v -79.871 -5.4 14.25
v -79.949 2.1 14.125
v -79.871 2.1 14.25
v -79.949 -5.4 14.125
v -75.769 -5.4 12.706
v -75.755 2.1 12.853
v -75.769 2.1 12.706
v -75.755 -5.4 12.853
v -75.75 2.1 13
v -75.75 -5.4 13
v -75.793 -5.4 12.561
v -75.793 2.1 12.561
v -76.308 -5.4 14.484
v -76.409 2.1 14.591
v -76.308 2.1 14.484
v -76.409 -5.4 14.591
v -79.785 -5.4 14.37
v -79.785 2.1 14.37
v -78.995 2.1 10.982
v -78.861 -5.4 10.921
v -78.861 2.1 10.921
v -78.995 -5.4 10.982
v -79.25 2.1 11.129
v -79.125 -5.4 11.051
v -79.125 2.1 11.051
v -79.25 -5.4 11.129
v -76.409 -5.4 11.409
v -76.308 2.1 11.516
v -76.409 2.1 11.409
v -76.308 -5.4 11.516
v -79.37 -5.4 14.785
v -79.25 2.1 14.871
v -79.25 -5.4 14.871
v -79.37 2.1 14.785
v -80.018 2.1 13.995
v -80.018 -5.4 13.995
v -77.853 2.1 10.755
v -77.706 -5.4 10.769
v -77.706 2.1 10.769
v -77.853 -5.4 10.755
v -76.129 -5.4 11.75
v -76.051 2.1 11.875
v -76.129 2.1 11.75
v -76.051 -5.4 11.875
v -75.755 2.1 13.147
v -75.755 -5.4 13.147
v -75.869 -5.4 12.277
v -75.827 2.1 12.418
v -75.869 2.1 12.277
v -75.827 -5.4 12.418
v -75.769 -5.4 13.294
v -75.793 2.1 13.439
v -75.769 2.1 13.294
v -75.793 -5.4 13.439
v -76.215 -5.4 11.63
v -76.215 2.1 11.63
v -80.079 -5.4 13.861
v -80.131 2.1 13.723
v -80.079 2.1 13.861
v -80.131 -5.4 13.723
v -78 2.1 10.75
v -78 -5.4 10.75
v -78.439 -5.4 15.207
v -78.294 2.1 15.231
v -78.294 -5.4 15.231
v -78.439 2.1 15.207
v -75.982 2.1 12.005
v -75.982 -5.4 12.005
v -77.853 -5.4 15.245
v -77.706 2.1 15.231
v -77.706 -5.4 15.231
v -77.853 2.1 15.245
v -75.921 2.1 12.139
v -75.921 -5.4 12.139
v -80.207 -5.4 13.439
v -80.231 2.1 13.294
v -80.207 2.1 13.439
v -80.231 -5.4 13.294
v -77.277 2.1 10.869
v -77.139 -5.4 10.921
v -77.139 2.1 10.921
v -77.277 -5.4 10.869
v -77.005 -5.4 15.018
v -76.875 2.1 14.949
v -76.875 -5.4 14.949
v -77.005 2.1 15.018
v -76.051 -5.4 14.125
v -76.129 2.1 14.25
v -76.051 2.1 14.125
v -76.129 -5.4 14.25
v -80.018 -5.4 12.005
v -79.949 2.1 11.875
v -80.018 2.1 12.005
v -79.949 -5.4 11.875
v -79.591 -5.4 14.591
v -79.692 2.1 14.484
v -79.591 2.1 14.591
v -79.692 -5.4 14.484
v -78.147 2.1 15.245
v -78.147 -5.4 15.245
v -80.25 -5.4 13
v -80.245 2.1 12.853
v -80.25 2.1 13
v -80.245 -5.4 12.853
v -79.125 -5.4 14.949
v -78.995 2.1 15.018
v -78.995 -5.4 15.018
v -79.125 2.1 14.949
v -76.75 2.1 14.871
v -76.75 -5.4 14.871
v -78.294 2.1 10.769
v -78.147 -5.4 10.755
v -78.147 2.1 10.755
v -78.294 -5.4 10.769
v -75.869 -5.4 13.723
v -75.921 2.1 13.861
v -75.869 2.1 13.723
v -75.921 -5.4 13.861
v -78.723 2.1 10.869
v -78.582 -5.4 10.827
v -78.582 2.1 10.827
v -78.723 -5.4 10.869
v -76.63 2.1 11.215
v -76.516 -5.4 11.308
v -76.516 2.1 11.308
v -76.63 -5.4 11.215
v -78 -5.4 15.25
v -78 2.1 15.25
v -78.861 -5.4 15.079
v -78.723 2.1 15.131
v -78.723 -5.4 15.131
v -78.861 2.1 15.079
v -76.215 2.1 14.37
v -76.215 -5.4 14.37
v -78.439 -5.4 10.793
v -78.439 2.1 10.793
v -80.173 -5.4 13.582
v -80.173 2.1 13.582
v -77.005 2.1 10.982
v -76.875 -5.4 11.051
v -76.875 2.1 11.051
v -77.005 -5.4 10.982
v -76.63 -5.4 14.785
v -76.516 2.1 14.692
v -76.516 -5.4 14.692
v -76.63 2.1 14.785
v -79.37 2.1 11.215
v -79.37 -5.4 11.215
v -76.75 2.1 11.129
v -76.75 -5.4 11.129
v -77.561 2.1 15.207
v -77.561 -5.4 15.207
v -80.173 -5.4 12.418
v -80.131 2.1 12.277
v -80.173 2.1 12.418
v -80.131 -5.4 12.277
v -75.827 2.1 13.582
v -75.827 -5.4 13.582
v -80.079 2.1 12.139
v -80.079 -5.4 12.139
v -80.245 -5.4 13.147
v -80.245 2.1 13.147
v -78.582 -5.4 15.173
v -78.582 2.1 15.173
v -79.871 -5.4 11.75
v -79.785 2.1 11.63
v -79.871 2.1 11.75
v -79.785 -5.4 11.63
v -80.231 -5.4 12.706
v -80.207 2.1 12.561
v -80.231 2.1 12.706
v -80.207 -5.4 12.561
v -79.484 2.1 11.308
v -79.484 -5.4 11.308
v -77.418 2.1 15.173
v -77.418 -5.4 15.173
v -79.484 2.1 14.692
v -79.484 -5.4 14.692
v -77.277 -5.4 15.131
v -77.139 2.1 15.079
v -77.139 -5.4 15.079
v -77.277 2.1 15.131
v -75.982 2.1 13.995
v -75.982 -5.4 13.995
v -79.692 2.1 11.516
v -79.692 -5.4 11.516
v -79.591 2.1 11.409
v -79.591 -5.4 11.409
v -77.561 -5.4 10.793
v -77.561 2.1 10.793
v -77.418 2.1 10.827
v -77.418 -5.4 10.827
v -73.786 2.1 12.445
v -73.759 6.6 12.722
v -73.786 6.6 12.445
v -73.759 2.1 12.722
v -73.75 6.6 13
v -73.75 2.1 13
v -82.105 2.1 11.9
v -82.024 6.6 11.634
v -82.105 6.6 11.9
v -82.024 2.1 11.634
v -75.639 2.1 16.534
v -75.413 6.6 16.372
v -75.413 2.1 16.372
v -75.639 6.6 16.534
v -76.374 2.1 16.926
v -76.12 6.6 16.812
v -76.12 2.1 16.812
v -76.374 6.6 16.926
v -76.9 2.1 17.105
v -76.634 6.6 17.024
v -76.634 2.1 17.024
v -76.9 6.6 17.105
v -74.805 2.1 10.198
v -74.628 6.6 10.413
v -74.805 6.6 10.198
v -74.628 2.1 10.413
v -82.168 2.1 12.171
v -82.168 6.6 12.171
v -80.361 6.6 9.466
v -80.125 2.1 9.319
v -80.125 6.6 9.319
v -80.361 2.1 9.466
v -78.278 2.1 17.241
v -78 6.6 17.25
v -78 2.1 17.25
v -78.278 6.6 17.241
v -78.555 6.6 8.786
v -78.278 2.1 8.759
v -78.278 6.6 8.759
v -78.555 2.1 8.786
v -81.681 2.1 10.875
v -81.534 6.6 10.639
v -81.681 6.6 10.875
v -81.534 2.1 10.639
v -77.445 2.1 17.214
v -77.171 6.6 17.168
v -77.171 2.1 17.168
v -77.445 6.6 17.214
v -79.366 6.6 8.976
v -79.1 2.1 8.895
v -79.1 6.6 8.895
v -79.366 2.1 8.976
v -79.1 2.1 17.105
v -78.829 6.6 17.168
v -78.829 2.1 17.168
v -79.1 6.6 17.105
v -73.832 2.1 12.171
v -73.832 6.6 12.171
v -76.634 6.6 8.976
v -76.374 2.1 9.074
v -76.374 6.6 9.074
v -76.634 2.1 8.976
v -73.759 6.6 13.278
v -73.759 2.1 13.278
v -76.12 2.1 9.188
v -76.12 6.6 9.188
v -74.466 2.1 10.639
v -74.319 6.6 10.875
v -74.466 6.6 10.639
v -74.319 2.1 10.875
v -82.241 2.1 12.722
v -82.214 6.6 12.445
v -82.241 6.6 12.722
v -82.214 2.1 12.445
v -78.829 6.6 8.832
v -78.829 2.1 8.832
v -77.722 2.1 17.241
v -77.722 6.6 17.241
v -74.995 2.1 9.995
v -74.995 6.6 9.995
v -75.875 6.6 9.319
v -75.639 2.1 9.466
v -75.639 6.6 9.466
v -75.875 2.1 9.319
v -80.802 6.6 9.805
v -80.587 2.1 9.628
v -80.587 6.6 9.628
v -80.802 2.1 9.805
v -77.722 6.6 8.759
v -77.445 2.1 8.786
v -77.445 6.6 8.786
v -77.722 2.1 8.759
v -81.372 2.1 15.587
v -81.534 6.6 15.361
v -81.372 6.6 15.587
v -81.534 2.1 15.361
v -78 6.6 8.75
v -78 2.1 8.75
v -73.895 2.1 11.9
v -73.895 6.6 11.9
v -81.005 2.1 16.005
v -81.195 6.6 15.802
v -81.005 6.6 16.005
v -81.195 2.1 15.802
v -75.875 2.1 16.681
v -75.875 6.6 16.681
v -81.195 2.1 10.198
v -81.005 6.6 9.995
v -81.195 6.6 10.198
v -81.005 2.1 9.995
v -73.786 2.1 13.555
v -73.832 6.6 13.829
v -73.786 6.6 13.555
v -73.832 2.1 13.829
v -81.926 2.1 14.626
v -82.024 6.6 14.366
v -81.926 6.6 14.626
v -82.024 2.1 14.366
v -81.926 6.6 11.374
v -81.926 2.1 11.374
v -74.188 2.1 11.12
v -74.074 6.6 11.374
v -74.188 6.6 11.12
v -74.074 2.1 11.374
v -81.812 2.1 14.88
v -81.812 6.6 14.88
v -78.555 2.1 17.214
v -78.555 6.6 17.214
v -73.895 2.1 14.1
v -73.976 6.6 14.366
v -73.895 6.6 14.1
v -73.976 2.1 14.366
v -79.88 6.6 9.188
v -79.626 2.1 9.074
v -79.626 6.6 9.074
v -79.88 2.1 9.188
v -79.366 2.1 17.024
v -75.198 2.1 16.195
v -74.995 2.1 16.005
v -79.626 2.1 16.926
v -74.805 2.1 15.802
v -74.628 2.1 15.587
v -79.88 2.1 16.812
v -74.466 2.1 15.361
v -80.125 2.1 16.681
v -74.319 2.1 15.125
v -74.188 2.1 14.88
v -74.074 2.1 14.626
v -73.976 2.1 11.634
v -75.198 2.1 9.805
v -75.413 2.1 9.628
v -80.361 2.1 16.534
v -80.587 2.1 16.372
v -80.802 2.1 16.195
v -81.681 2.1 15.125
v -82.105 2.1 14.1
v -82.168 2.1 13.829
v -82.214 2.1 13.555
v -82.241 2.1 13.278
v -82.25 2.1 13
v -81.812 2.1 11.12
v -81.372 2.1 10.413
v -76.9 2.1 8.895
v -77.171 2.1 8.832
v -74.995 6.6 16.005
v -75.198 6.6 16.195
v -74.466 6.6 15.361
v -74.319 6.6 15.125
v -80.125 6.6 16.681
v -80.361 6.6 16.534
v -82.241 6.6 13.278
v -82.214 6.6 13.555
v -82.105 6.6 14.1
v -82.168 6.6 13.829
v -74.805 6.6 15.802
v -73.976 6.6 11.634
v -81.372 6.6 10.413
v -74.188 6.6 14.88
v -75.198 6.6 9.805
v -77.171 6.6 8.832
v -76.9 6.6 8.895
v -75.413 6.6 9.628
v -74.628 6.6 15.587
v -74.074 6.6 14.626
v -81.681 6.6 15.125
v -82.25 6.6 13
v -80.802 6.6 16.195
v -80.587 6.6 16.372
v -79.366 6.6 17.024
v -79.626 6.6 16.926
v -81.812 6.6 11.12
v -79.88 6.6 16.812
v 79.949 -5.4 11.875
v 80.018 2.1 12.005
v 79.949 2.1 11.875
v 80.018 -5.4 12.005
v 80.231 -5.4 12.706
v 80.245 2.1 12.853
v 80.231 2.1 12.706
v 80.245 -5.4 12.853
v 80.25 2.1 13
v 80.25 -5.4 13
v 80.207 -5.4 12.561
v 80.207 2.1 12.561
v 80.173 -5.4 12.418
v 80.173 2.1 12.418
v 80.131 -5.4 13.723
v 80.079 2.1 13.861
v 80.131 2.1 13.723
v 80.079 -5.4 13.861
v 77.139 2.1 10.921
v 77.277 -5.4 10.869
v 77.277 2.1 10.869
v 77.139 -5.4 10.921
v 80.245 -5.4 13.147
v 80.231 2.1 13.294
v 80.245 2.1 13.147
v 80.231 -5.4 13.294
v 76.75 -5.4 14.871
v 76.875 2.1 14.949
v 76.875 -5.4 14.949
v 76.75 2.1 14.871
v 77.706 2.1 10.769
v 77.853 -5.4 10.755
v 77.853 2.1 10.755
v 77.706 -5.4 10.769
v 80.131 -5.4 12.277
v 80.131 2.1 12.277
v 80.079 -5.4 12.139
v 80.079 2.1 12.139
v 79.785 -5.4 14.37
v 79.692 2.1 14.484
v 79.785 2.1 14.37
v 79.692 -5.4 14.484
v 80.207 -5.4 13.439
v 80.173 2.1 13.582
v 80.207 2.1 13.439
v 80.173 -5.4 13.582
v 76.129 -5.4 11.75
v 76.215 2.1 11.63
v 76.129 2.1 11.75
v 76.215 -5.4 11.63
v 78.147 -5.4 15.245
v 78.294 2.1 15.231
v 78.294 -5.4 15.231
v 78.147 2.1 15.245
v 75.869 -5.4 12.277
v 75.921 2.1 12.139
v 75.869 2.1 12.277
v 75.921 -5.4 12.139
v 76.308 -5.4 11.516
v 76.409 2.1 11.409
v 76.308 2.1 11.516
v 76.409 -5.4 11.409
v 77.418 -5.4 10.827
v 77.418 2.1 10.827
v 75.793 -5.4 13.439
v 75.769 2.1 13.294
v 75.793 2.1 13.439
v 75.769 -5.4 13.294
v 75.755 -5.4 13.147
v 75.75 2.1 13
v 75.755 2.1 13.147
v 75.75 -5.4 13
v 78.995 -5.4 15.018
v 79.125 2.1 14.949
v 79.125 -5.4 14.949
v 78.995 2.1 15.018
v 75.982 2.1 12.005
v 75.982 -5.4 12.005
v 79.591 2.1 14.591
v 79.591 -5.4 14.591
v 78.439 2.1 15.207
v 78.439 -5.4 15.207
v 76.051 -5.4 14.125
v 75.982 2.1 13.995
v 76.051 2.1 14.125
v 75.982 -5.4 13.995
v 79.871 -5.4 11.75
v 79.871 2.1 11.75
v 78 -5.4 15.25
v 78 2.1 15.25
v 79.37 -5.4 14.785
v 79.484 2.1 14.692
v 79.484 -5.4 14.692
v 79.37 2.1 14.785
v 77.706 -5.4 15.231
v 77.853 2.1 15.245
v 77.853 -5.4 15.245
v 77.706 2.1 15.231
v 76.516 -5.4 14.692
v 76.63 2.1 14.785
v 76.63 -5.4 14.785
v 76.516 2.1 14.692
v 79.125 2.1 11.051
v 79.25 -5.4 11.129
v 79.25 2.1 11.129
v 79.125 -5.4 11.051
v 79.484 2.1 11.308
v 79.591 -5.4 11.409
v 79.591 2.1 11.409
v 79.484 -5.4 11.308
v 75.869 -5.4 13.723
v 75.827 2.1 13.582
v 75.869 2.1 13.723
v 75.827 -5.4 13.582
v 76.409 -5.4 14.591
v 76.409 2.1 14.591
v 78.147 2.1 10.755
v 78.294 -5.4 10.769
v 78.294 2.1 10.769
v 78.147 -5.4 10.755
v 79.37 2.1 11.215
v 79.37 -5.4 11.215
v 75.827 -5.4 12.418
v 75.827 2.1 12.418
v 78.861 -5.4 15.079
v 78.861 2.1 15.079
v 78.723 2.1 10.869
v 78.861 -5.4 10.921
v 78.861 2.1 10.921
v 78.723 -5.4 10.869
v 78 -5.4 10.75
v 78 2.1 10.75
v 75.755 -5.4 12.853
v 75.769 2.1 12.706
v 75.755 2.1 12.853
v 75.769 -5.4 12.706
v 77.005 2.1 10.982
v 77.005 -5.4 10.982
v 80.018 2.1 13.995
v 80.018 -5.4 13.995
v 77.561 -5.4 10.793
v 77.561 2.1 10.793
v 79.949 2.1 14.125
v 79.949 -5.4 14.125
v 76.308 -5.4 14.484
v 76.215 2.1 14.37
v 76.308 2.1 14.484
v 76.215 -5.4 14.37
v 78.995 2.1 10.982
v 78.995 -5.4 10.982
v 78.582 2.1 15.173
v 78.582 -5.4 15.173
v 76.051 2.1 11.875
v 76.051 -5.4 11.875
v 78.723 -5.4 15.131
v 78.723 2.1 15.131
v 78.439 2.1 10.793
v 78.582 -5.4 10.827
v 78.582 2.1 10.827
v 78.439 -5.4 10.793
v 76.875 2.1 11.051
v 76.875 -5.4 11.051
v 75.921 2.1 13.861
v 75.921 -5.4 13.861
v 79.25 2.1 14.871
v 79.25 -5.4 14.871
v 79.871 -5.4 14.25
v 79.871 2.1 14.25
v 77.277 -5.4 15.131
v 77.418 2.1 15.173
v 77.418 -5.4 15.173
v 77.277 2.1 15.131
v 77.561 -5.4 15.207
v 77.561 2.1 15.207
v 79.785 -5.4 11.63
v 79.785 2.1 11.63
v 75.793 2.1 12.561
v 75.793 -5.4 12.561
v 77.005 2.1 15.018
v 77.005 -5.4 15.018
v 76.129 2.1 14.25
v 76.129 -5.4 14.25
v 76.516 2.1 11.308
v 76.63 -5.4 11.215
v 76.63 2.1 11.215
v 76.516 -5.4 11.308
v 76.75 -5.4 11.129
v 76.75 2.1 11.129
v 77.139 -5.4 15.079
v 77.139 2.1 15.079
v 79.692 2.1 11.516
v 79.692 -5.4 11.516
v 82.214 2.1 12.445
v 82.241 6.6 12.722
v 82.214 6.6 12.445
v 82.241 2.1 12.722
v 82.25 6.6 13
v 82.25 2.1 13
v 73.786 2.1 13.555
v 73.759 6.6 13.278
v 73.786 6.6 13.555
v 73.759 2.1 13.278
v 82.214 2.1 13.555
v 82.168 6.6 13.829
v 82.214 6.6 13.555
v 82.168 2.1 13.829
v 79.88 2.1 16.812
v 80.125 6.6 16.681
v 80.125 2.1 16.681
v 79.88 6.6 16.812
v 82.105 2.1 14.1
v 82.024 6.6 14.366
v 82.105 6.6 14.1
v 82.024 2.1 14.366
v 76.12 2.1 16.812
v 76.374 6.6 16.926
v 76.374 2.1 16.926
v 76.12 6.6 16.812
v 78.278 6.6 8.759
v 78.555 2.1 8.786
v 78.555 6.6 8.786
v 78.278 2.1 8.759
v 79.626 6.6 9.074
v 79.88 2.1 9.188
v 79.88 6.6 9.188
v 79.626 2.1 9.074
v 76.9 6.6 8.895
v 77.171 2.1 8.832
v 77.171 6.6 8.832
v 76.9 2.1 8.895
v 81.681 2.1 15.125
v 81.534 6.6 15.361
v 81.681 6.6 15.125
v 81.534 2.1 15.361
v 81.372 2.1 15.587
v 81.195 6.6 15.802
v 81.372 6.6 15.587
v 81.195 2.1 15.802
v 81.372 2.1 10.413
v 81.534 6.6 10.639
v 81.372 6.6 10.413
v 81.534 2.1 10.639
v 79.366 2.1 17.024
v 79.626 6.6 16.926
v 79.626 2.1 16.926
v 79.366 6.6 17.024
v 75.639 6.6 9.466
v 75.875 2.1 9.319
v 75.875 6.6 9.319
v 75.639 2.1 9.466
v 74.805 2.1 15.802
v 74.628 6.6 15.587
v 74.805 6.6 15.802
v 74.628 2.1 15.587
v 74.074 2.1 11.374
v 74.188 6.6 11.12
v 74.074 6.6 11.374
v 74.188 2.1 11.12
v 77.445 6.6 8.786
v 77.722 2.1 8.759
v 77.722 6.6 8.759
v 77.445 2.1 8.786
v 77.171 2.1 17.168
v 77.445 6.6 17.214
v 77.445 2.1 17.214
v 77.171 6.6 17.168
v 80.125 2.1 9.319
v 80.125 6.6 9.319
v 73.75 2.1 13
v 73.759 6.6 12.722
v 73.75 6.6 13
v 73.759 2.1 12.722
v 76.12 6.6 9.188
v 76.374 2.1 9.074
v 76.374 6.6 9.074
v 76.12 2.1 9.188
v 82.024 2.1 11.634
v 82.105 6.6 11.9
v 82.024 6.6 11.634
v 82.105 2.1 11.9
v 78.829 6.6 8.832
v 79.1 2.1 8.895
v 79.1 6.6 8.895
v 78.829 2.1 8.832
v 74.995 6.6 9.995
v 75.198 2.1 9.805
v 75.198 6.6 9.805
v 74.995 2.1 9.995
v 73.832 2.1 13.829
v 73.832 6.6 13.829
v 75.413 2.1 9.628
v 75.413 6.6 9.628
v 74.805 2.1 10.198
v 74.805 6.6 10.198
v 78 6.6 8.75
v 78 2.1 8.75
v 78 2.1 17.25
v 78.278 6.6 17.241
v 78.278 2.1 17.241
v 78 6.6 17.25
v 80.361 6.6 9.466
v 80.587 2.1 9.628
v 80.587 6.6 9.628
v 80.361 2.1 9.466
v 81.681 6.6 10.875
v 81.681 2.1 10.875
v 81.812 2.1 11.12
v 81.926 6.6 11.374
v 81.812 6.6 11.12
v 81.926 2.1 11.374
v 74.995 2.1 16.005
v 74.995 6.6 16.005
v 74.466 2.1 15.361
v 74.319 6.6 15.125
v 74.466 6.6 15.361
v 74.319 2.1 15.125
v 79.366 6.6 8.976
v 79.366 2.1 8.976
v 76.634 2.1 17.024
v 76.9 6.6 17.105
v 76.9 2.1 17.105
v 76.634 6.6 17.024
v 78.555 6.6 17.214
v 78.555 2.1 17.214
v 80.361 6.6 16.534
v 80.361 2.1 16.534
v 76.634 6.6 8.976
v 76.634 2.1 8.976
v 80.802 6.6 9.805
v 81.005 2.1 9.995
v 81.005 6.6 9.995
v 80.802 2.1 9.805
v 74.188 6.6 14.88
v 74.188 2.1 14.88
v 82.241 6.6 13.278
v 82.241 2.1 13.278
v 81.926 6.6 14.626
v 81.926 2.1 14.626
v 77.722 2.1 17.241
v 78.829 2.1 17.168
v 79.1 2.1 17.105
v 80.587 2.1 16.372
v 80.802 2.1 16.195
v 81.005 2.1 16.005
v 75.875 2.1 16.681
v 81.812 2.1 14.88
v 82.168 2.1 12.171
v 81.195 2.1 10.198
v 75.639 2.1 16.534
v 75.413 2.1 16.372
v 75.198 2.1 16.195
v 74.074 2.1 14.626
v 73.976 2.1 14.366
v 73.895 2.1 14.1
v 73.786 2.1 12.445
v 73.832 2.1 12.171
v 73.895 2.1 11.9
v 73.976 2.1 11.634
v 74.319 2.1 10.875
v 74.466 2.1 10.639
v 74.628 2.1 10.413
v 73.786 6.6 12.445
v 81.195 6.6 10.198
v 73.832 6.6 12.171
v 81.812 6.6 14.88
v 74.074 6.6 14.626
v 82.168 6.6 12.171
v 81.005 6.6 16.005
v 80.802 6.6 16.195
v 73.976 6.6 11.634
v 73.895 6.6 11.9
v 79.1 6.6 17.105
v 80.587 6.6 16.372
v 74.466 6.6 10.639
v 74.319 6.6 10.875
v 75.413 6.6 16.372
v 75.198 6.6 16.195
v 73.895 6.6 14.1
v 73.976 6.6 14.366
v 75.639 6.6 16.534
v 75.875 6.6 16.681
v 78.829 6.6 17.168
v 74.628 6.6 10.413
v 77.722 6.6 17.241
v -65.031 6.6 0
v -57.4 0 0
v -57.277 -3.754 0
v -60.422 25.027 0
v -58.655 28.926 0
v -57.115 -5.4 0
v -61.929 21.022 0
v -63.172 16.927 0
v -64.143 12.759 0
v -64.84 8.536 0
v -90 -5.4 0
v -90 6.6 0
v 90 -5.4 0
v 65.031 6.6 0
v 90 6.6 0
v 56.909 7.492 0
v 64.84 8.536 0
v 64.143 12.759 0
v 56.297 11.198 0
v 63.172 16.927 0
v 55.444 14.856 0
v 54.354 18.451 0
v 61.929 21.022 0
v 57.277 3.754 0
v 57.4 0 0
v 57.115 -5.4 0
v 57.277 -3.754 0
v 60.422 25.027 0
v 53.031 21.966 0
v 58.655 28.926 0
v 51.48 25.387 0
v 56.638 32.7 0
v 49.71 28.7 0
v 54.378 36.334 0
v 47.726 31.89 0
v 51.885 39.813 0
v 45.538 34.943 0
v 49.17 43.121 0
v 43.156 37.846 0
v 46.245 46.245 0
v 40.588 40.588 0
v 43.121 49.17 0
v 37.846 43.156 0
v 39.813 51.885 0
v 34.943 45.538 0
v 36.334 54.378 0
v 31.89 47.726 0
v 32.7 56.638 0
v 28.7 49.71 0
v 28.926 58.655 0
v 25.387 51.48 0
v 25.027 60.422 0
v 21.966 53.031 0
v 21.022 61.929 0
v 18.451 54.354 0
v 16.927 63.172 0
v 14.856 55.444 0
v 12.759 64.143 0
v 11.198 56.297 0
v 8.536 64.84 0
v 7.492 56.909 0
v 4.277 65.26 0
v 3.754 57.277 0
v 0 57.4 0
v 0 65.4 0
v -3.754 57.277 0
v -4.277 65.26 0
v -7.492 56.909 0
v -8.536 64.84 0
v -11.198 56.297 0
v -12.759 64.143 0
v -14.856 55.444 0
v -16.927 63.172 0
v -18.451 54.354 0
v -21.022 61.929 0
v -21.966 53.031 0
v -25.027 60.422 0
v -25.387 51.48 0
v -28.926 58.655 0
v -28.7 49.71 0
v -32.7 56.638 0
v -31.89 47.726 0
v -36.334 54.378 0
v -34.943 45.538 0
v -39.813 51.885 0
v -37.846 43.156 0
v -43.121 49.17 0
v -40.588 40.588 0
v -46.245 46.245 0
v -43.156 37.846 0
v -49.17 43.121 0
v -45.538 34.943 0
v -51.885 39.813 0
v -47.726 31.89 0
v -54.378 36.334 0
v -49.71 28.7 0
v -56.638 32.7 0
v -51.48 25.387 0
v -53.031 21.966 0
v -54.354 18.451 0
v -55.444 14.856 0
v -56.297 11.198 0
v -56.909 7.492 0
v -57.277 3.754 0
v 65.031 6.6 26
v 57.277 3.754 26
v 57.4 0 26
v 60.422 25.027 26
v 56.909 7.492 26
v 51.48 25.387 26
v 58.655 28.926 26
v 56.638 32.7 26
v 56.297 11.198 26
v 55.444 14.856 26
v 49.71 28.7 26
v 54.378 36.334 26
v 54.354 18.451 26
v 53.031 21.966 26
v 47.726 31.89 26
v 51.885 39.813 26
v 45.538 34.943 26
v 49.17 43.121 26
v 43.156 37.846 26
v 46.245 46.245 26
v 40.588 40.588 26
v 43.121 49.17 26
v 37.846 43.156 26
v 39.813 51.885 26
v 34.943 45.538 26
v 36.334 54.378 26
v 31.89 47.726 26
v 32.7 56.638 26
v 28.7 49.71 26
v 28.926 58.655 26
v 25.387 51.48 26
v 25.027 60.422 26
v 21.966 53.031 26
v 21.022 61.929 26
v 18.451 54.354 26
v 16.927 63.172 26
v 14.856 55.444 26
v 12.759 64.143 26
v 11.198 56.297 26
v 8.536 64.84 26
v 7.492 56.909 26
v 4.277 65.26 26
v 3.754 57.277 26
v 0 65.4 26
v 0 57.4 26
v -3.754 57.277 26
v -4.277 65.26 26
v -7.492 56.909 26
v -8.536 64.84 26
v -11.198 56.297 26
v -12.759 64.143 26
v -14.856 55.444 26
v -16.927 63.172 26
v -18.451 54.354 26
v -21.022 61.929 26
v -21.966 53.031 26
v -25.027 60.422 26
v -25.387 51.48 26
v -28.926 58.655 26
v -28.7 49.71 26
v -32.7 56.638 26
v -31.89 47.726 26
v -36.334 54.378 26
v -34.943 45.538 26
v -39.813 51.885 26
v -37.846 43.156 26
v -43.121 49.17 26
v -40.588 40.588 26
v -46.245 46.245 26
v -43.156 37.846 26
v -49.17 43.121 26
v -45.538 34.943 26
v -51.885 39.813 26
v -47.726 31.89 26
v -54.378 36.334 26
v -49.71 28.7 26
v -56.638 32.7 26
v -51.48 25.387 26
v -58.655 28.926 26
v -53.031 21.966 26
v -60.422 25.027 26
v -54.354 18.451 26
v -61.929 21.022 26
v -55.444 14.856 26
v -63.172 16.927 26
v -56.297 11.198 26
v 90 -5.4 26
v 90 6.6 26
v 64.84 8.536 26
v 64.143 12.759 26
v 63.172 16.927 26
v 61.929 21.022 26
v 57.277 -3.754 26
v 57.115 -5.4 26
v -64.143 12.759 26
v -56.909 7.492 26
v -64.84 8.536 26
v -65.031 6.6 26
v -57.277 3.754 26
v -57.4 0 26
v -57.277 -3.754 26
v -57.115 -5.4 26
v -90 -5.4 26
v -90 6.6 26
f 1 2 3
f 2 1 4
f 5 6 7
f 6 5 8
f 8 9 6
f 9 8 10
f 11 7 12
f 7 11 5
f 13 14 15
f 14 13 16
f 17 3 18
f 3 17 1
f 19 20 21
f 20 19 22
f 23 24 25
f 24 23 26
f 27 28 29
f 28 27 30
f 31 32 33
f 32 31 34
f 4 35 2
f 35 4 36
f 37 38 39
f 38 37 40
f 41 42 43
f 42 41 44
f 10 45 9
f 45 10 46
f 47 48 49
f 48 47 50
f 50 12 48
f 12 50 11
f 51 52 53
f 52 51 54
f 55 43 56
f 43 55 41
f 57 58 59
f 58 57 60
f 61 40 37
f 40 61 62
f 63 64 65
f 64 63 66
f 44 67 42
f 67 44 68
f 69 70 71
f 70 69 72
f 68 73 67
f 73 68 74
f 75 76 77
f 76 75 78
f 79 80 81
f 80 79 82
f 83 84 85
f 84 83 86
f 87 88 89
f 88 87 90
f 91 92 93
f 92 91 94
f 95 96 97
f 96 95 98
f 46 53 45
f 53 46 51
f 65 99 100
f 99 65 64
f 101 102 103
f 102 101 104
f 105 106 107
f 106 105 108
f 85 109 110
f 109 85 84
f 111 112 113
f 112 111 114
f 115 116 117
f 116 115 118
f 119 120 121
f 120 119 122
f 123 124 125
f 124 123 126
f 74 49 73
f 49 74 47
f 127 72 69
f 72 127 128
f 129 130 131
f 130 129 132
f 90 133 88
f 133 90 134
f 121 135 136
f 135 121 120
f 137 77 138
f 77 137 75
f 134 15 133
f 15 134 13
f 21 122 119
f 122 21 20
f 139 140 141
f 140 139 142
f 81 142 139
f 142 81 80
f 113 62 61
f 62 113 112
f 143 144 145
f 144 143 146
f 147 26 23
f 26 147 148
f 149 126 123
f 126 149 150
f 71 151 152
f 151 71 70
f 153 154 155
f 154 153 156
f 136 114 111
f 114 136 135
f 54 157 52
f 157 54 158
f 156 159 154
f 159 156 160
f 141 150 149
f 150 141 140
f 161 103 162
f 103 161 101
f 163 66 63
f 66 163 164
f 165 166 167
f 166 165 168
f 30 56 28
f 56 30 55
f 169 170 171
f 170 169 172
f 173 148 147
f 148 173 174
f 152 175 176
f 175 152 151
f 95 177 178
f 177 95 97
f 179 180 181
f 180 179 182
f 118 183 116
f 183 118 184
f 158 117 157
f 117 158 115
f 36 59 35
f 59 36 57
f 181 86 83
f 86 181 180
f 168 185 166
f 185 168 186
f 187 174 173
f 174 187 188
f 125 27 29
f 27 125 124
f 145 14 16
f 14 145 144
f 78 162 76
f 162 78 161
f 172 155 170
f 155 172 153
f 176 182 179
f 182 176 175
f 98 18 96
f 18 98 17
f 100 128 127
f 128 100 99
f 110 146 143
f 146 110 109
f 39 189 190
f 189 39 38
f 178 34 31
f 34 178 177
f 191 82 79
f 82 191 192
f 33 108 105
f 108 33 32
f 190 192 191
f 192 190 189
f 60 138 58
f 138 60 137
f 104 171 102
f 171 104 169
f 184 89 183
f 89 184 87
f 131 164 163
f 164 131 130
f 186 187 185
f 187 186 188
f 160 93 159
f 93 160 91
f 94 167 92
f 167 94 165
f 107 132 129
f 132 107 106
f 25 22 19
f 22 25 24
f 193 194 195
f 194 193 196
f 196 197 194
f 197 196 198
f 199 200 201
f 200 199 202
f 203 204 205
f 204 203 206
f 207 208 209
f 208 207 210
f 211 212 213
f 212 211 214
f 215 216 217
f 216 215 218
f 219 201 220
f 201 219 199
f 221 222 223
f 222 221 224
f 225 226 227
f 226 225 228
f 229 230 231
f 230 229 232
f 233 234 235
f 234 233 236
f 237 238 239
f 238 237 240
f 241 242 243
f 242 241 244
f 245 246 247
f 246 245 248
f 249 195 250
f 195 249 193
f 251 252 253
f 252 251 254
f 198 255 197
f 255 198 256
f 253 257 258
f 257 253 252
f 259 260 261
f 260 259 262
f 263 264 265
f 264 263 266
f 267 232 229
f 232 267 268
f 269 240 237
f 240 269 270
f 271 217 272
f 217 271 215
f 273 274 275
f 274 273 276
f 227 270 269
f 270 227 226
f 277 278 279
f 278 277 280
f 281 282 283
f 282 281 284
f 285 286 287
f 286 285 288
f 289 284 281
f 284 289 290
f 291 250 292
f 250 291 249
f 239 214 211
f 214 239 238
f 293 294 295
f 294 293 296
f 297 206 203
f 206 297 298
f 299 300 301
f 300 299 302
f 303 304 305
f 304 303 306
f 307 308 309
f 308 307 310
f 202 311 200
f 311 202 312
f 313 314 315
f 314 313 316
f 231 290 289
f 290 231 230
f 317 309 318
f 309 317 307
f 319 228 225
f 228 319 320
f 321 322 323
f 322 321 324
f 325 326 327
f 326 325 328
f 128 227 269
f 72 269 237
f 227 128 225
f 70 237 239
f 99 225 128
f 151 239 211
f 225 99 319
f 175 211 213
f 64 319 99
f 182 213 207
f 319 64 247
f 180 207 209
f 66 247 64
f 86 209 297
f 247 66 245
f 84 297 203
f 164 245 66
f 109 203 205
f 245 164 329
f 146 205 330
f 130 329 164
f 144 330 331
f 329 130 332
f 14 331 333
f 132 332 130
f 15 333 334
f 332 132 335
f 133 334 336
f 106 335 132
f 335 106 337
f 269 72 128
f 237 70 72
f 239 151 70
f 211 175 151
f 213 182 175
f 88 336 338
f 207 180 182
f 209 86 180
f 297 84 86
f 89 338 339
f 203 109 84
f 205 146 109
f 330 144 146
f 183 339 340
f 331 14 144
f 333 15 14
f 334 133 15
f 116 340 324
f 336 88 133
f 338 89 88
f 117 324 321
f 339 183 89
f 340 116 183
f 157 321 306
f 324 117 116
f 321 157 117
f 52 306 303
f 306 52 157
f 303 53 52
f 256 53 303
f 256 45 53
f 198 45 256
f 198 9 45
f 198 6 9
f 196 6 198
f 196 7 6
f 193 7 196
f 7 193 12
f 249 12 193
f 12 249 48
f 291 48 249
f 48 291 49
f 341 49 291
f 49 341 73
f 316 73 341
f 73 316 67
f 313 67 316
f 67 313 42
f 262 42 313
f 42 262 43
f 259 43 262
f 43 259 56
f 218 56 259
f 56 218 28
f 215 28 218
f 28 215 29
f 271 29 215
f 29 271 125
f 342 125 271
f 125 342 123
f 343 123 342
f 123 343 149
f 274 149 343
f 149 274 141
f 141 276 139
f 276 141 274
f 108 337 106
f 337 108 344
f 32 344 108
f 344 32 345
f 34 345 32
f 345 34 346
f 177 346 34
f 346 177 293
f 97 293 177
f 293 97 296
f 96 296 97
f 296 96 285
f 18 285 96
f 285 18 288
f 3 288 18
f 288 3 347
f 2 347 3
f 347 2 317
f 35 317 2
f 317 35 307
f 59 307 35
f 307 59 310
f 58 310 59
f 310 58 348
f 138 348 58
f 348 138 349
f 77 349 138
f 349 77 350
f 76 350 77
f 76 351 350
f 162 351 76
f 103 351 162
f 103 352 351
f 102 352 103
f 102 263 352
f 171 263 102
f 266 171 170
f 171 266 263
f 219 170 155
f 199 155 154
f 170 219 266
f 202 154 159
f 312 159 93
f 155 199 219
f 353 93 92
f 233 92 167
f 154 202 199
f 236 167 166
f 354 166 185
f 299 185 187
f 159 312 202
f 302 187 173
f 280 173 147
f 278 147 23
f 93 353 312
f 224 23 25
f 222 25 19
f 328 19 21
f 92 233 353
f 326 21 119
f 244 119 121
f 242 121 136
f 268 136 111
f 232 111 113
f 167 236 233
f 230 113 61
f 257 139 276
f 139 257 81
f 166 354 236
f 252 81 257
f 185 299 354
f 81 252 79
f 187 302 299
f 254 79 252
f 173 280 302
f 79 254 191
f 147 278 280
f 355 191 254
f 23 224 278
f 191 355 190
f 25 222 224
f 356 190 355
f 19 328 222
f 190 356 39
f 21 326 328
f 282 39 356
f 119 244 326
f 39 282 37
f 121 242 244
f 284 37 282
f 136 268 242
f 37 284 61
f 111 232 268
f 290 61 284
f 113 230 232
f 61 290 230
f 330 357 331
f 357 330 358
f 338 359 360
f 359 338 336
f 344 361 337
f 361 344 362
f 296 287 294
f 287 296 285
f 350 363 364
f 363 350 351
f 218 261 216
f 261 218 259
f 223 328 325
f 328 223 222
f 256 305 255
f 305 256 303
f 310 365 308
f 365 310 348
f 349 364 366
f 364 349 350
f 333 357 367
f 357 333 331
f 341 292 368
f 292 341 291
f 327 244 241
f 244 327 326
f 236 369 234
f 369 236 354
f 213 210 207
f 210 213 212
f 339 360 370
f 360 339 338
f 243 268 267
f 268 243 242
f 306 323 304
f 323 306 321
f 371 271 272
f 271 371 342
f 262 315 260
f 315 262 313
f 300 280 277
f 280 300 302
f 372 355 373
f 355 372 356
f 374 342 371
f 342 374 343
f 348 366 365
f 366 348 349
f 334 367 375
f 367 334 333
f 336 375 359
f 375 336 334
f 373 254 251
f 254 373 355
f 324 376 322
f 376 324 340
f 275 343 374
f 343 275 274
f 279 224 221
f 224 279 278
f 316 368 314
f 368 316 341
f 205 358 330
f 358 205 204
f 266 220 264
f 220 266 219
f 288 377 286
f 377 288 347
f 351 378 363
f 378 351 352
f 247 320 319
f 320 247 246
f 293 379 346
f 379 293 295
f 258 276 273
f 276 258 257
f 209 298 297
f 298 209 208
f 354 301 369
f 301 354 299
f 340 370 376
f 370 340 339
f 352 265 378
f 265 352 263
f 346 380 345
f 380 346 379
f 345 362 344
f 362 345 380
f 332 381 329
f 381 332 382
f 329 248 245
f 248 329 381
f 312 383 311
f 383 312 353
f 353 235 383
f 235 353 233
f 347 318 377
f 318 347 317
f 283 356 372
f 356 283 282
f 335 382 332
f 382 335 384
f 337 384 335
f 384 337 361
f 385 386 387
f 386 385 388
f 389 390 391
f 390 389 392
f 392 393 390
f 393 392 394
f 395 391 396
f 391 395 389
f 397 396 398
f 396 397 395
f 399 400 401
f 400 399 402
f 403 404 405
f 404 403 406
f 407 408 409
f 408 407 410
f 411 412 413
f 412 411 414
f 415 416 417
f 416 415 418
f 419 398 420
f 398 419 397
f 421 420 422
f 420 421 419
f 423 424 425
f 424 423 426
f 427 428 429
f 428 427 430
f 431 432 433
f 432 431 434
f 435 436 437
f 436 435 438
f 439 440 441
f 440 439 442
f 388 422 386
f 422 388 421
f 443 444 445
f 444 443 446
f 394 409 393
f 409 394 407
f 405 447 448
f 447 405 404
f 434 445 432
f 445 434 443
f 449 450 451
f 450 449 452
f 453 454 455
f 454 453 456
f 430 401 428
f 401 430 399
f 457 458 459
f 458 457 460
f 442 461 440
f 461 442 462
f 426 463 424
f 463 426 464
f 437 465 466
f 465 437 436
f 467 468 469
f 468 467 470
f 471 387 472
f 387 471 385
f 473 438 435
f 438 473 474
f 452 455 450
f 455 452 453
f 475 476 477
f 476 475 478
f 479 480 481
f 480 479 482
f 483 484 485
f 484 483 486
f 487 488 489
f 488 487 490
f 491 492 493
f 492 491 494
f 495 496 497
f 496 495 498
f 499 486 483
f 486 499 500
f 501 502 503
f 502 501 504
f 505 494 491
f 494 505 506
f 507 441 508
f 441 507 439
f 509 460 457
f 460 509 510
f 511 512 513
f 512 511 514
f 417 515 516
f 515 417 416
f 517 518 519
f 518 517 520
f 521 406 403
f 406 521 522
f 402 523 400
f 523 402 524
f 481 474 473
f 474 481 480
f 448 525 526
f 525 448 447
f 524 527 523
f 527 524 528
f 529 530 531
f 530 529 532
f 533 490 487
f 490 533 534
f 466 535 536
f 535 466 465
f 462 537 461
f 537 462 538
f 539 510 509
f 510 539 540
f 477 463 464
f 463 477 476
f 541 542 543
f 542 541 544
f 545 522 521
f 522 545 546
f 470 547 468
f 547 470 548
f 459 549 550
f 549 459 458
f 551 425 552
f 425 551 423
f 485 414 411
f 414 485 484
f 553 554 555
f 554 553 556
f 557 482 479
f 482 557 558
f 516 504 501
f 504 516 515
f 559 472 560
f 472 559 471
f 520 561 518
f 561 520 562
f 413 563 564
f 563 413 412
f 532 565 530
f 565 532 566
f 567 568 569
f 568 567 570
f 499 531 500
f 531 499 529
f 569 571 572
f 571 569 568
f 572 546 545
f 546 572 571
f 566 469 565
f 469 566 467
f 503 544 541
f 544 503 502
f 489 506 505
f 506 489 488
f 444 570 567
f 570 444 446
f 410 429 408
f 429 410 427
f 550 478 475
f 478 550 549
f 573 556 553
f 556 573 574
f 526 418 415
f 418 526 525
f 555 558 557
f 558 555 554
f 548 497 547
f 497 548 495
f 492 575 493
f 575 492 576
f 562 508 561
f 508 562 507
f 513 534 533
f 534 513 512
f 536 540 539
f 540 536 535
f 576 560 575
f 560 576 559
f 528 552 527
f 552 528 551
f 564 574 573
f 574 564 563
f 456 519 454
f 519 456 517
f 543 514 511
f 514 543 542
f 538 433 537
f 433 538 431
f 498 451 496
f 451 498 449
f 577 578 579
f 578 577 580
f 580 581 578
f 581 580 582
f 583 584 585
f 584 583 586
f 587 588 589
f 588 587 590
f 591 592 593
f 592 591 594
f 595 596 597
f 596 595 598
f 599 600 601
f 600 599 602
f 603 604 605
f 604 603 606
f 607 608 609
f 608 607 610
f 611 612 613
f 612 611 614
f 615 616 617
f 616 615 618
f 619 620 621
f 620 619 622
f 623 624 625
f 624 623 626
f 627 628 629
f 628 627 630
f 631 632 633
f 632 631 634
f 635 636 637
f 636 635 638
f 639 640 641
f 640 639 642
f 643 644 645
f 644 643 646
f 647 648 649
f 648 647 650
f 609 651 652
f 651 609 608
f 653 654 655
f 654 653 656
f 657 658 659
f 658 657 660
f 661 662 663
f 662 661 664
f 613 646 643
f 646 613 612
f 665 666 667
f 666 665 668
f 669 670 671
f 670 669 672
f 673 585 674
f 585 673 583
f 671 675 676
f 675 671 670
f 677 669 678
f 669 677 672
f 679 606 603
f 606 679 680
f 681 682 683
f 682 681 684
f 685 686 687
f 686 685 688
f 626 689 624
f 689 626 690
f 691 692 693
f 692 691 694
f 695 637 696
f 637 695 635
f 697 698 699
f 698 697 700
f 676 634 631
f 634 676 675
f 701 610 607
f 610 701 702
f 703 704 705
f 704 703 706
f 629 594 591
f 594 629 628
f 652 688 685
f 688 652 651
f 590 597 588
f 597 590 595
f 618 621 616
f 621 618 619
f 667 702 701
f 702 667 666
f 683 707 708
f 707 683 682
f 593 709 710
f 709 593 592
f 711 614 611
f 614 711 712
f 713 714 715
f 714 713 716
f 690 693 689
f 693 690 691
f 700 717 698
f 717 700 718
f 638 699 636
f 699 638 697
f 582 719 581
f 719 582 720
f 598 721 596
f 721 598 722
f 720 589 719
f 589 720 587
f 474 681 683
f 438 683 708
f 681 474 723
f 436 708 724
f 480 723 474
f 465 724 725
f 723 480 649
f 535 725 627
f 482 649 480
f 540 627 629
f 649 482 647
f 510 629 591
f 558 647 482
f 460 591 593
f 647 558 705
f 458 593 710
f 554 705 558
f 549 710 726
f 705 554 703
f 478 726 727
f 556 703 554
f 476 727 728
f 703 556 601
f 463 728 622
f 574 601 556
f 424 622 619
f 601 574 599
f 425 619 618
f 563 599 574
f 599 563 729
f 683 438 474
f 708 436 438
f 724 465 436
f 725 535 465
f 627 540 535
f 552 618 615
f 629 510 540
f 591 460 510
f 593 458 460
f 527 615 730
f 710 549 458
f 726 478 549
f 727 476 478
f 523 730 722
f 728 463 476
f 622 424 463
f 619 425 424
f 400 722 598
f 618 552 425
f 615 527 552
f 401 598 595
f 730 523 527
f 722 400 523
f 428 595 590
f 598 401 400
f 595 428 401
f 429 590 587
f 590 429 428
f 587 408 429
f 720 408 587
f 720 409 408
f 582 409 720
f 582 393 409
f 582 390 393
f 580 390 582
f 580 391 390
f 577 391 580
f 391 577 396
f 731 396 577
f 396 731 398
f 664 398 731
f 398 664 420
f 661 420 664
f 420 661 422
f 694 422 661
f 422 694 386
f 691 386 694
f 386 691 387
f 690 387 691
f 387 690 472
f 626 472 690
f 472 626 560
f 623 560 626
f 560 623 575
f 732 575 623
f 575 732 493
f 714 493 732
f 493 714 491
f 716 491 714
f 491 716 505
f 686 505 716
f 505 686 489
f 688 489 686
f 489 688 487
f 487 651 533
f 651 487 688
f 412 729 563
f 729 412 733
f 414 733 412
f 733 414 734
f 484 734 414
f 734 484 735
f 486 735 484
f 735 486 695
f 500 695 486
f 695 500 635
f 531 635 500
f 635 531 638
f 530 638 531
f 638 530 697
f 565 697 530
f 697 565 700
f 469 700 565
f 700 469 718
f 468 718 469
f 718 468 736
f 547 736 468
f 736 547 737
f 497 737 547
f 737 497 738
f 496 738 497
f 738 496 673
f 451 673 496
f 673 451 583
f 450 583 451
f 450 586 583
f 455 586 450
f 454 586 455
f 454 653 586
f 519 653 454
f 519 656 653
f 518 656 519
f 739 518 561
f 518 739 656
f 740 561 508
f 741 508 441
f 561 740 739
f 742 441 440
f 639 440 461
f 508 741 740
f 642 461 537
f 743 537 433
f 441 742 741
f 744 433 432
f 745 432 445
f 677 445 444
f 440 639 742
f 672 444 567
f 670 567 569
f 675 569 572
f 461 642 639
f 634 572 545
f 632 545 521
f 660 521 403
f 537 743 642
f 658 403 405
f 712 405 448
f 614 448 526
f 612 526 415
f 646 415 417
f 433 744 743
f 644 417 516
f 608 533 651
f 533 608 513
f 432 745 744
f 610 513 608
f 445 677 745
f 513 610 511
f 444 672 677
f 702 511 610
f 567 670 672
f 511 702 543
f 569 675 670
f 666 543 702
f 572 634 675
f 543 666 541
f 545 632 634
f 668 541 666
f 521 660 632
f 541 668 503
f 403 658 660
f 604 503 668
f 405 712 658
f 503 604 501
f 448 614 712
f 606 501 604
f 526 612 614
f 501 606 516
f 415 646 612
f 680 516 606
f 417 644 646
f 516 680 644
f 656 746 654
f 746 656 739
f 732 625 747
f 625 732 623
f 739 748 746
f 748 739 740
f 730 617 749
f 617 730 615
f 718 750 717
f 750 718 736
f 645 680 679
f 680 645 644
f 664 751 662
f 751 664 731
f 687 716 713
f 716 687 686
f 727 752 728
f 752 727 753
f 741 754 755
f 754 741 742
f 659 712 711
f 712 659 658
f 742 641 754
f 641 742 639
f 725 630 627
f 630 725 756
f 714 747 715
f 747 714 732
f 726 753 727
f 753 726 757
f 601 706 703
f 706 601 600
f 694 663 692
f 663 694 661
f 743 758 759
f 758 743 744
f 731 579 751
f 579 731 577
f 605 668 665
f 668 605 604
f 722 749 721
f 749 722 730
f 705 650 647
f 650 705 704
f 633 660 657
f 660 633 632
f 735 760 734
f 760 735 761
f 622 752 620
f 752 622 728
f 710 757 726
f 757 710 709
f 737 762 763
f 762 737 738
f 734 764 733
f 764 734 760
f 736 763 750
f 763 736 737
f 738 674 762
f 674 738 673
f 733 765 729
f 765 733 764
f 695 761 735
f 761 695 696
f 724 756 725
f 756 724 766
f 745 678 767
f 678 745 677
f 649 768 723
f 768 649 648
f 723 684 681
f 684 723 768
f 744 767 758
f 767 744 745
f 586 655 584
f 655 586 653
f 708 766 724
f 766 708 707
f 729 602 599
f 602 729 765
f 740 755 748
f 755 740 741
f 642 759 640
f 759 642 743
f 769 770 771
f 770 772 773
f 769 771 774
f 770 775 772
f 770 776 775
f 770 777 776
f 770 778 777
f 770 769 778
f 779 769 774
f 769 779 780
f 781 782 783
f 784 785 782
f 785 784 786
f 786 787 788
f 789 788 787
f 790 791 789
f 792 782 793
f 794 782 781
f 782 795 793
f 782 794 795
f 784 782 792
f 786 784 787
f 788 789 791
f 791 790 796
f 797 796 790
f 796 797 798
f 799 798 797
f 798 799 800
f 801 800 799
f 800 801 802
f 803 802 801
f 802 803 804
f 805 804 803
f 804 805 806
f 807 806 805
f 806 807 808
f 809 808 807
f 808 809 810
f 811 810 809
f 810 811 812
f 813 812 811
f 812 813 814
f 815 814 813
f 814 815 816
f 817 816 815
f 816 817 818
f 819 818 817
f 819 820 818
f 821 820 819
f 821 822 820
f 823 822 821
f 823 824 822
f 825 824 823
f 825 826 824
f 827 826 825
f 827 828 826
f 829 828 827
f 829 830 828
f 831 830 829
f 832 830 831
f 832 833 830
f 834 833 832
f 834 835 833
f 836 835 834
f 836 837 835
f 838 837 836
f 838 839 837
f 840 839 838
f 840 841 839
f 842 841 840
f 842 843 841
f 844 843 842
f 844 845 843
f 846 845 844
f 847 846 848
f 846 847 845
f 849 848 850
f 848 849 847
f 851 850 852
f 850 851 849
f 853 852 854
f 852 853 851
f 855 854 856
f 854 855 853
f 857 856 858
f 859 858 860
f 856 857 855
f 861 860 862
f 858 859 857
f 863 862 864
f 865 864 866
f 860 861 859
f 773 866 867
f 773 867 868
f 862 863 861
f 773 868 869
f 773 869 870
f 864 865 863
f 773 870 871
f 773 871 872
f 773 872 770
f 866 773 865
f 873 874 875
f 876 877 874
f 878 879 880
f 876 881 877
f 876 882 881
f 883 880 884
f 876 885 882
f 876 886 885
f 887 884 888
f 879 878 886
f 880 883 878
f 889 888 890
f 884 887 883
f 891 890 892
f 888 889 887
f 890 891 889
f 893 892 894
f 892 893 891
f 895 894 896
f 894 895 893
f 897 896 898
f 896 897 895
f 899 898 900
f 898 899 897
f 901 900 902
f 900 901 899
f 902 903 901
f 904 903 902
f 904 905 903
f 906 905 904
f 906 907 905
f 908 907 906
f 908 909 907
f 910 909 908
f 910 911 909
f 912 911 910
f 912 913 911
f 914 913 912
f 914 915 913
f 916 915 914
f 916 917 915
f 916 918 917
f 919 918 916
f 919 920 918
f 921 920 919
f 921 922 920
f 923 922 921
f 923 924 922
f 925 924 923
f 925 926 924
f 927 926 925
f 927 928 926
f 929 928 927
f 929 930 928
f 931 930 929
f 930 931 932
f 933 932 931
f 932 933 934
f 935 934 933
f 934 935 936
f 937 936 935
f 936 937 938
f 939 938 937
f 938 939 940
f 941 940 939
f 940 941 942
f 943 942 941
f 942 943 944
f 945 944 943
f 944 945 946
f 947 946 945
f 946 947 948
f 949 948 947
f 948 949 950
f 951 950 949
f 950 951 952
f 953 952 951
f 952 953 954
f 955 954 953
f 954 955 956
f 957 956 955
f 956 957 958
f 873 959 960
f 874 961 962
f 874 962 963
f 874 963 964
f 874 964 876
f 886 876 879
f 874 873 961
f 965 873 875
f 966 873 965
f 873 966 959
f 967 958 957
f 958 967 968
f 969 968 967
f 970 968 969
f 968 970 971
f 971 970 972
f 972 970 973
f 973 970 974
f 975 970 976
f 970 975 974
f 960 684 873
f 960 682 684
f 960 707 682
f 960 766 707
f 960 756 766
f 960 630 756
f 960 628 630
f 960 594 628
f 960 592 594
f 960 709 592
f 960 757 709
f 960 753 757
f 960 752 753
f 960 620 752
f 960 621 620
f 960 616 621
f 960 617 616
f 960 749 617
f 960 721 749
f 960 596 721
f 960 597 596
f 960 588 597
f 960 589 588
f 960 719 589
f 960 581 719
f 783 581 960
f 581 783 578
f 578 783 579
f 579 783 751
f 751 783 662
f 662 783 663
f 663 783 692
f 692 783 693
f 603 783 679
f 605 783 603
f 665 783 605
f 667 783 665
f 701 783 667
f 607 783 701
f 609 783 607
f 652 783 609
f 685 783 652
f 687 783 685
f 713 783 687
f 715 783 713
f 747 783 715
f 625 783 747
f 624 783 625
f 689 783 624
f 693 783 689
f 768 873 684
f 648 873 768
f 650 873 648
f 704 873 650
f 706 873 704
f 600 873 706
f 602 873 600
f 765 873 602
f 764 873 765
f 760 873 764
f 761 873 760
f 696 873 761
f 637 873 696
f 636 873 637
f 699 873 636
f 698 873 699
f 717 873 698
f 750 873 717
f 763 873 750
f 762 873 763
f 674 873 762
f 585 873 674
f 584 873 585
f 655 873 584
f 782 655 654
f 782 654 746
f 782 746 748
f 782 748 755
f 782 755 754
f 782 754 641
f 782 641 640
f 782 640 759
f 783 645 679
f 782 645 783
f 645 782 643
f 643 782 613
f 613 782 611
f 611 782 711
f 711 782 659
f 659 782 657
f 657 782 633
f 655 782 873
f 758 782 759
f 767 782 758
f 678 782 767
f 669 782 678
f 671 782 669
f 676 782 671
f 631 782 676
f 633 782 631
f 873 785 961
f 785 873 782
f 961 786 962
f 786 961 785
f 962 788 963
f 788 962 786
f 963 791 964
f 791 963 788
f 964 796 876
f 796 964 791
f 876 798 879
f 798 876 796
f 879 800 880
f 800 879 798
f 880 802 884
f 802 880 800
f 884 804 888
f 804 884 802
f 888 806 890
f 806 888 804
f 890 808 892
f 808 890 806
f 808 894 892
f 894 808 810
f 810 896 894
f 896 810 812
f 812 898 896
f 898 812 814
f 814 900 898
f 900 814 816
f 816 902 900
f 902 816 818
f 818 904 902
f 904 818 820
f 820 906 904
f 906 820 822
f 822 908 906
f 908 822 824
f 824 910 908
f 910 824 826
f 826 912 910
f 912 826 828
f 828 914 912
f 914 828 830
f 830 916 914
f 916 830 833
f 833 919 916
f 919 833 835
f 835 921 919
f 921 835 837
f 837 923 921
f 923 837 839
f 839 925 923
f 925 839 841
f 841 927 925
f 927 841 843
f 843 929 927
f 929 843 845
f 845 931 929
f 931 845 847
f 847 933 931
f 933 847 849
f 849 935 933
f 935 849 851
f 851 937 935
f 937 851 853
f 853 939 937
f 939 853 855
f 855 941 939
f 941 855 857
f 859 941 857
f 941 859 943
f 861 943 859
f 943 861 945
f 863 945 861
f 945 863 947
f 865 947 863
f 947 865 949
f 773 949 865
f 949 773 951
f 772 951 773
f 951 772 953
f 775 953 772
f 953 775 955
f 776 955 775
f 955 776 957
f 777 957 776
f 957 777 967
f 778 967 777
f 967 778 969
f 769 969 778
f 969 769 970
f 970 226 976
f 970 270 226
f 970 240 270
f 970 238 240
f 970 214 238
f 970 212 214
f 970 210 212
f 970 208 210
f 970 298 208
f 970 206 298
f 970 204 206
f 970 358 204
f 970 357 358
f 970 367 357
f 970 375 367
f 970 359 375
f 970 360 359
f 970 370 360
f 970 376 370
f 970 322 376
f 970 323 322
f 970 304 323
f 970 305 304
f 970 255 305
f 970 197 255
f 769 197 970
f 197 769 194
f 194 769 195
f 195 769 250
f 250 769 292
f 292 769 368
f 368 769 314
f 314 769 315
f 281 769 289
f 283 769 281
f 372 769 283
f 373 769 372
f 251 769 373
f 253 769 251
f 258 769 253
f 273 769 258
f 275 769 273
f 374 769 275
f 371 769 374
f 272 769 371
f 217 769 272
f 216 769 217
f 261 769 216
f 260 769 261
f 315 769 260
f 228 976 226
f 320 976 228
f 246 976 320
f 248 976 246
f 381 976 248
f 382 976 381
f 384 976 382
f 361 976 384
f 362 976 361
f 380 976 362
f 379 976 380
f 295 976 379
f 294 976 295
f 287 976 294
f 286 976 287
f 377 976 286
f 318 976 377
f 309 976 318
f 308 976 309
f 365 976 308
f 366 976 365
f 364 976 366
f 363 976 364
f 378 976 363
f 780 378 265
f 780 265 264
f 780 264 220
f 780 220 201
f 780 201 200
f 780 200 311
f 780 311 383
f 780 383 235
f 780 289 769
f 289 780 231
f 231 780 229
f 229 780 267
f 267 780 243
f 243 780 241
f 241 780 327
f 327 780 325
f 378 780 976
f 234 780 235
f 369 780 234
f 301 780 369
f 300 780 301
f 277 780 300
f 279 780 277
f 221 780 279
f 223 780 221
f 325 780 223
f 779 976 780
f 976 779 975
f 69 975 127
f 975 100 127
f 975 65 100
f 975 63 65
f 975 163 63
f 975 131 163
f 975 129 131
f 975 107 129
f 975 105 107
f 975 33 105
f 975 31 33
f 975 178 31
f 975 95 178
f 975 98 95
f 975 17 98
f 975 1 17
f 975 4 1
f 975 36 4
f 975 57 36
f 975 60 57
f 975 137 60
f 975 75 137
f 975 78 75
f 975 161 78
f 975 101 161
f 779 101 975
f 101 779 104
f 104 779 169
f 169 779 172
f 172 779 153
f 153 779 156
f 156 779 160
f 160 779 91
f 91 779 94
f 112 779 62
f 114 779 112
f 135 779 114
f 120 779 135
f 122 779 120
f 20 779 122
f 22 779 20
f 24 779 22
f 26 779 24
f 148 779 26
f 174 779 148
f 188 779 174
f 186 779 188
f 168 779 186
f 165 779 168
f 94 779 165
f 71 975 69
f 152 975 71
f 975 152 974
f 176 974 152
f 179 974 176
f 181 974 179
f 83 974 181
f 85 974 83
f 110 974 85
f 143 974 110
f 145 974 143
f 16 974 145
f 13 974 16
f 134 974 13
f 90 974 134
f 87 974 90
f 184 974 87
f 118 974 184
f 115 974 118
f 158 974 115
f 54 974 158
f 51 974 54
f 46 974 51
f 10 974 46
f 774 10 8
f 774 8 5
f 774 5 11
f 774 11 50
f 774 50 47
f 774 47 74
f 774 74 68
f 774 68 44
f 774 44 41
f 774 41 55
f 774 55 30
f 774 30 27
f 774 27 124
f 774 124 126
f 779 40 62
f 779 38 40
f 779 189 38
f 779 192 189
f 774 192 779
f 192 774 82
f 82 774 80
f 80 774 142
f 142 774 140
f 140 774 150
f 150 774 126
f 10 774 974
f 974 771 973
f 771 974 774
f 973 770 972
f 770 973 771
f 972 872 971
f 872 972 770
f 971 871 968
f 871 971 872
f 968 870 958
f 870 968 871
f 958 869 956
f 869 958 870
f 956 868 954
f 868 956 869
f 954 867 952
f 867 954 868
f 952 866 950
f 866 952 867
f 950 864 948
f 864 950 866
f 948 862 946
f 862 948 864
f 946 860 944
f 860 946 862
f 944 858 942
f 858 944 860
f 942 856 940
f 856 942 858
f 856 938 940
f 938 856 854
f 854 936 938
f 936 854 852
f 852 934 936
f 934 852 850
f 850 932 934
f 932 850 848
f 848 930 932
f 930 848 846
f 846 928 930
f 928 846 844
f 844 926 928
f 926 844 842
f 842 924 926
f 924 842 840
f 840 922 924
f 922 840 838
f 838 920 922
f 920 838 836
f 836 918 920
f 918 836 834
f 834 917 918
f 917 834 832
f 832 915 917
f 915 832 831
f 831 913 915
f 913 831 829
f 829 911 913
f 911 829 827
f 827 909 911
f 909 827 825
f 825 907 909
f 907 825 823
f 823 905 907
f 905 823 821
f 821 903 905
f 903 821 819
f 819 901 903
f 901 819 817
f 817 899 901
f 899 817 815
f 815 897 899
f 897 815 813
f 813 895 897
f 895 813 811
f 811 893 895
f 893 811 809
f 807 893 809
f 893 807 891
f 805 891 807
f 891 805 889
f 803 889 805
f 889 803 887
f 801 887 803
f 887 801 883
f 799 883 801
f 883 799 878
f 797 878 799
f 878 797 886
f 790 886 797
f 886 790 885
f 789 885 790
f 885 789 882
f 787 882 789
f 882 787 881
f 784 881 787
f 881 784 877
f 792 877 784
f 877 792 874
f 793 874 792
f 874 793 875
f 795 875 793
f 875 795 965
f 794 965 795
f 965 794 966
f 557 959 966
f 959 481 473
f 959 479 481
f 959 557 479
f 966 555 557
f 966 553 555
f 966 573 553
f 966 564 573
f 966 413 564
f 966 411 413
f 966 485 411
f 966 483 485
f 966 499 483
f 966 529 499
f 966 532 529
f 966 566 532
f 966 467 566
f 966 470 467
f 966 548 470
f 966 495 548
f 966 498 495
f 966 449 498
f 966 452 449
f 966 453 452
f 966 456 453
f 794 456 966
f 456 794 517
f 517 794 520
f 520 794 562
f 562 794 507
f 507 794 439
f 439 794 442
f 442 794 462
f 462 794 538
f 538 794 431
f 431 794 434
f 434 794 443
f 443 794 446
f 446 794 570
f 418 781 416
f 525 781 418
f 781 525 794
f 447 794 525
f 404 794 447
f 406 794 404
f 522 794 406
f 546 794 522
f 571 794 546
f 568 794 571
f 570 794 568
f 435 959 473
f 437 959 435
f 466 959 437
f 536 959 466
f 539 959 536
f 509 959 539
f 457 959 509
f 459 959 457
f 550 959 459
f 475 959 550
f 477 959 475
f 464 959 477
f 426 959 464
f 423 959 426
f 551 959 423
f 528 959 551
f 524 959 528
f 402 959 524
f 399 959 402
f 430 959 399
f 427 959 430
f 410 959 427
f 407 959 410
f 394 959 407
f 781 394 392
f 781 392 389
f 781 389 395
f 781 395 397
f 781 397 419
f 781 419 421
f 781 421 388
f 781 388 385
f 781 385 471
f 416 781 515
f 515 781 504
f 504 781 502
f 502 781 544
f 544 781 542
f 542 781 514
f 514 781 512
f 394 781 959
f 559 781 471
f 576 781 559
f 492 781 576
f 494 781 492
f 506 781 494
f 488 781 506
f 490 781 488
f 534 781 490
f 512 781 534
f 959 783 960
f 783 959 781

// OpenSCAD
// =====================================================================
// child_clamp_strap.scad — 子機チューブクランプ 上ストラップ (2個印刷)
// child_clamp_base に M4×2 で締結する上側半リング。
// クランプ面には薄ゴム/EVAシートを貼り、締め代はシート圧縮で確保。
// 印刷向き: 平置き(リング面を下)。 M4穴は垂直で綺麗に出る。
// =====================================================================

/* [チューブ (実測値) — child_clamp_base と一致させる] */
tube_od    = 114.3;
fit_clear  = 0.5;

/* [ストラップ] */
band_t     = 8;       // バンド肉厚(半径方向)
band_w     = 26;      // バンド幅(チューブ軸方向) = base saddle_d
m4_x       = 78;      // M4位置(±) = base と一致
m4_d       = 4.5;     // M4クリアランス
head_d     = 8.5;     // M4ナベ/キャップ頭径+余裕 (座グリ)
head_t     = 4.5;     // 座グリ深さ

$fn = 96;

// ---- 導出 -----------------------------------------------------------
tube_r  = (tube_od + fit_clear) / 2;   // 57.4
r_out   = tube_r + band_t;             // 65.4
// ベースブロック上面はチューブ中心から block_h - center_z = -5.4 (base側と整合)
chord_z = -5.4;                        // 耳の下面高さ(チューブ中心基準)
ear_w   = 24;
ear_t   = chord_z + 12;                // 耳上面 z=+6.6 → 耳厚12

// ---- チェック ---------------------------------------------------------
assert(m4_x - m4_d/2 > r_out + 2, "M4穴がリング外周と干渉");
assert(m4_x - head_d/2 > r_out + 0.5, "M4座グリがリング外周と干渉");
half_at_ear = sqrt(tube_r*tube_r - chord_z*chord_z);
assert(m4_x + ear_w/2 > half_at_ear, "耳がチューブ断面より内側");

// ---- 本体 -------------------------------------------------------------
// 2D: x=水平, y=組立時の上下(チューブ中心=原点)。Z にバンド幅を押し出す。
// 印刷はこの向きのまま平置き。M4は押し出し後に y 軸方向の真円で開ける。
difference() {
    linear_extrude(height = band_w)
        union() {
            // 上半リング (chord_z より上)
            intersection() {
                difference() { circle(r = r_out); circle(r = tube_r); }
                translate([-m4_x - ear_w/2, chord_z])
                    square([2*(m4_x + ear_w/2), r_out - chord_z + 1]);
            }
            // 左右の耳 (ベースのボルト柱上面に載る)。リング外周(r_out)と
            // 必ず重なるよう内側エッジをチューブ半径+0.5まで伸ばす。
            for (sx=[-1,1]) mirror([sx < 0 ? 1 : 0, 0, 0])
                translate([tube_r + 0.5, chord_z])
                    square([m4_x + ear_w/2 - tube_r - 0.5, 12]);
        }
    // M4 貫通穴 + 頭座グリ (組立時の垂直 = 2D y 方向)
    for (sx=[-1,1]) {
        translate([sx*m4_x, chord_z - 1, band_w/2])
            rotate([-90, 0, 0]) cylinder(d = m4_d, h = 14 + 2);
        translate([sx*m4_x, chord_z + 12 - head_t, band_w/2])
            rotate([-90, 0, 0]) cylinder(d = head_d, h = head_t + 1);
    }
}
